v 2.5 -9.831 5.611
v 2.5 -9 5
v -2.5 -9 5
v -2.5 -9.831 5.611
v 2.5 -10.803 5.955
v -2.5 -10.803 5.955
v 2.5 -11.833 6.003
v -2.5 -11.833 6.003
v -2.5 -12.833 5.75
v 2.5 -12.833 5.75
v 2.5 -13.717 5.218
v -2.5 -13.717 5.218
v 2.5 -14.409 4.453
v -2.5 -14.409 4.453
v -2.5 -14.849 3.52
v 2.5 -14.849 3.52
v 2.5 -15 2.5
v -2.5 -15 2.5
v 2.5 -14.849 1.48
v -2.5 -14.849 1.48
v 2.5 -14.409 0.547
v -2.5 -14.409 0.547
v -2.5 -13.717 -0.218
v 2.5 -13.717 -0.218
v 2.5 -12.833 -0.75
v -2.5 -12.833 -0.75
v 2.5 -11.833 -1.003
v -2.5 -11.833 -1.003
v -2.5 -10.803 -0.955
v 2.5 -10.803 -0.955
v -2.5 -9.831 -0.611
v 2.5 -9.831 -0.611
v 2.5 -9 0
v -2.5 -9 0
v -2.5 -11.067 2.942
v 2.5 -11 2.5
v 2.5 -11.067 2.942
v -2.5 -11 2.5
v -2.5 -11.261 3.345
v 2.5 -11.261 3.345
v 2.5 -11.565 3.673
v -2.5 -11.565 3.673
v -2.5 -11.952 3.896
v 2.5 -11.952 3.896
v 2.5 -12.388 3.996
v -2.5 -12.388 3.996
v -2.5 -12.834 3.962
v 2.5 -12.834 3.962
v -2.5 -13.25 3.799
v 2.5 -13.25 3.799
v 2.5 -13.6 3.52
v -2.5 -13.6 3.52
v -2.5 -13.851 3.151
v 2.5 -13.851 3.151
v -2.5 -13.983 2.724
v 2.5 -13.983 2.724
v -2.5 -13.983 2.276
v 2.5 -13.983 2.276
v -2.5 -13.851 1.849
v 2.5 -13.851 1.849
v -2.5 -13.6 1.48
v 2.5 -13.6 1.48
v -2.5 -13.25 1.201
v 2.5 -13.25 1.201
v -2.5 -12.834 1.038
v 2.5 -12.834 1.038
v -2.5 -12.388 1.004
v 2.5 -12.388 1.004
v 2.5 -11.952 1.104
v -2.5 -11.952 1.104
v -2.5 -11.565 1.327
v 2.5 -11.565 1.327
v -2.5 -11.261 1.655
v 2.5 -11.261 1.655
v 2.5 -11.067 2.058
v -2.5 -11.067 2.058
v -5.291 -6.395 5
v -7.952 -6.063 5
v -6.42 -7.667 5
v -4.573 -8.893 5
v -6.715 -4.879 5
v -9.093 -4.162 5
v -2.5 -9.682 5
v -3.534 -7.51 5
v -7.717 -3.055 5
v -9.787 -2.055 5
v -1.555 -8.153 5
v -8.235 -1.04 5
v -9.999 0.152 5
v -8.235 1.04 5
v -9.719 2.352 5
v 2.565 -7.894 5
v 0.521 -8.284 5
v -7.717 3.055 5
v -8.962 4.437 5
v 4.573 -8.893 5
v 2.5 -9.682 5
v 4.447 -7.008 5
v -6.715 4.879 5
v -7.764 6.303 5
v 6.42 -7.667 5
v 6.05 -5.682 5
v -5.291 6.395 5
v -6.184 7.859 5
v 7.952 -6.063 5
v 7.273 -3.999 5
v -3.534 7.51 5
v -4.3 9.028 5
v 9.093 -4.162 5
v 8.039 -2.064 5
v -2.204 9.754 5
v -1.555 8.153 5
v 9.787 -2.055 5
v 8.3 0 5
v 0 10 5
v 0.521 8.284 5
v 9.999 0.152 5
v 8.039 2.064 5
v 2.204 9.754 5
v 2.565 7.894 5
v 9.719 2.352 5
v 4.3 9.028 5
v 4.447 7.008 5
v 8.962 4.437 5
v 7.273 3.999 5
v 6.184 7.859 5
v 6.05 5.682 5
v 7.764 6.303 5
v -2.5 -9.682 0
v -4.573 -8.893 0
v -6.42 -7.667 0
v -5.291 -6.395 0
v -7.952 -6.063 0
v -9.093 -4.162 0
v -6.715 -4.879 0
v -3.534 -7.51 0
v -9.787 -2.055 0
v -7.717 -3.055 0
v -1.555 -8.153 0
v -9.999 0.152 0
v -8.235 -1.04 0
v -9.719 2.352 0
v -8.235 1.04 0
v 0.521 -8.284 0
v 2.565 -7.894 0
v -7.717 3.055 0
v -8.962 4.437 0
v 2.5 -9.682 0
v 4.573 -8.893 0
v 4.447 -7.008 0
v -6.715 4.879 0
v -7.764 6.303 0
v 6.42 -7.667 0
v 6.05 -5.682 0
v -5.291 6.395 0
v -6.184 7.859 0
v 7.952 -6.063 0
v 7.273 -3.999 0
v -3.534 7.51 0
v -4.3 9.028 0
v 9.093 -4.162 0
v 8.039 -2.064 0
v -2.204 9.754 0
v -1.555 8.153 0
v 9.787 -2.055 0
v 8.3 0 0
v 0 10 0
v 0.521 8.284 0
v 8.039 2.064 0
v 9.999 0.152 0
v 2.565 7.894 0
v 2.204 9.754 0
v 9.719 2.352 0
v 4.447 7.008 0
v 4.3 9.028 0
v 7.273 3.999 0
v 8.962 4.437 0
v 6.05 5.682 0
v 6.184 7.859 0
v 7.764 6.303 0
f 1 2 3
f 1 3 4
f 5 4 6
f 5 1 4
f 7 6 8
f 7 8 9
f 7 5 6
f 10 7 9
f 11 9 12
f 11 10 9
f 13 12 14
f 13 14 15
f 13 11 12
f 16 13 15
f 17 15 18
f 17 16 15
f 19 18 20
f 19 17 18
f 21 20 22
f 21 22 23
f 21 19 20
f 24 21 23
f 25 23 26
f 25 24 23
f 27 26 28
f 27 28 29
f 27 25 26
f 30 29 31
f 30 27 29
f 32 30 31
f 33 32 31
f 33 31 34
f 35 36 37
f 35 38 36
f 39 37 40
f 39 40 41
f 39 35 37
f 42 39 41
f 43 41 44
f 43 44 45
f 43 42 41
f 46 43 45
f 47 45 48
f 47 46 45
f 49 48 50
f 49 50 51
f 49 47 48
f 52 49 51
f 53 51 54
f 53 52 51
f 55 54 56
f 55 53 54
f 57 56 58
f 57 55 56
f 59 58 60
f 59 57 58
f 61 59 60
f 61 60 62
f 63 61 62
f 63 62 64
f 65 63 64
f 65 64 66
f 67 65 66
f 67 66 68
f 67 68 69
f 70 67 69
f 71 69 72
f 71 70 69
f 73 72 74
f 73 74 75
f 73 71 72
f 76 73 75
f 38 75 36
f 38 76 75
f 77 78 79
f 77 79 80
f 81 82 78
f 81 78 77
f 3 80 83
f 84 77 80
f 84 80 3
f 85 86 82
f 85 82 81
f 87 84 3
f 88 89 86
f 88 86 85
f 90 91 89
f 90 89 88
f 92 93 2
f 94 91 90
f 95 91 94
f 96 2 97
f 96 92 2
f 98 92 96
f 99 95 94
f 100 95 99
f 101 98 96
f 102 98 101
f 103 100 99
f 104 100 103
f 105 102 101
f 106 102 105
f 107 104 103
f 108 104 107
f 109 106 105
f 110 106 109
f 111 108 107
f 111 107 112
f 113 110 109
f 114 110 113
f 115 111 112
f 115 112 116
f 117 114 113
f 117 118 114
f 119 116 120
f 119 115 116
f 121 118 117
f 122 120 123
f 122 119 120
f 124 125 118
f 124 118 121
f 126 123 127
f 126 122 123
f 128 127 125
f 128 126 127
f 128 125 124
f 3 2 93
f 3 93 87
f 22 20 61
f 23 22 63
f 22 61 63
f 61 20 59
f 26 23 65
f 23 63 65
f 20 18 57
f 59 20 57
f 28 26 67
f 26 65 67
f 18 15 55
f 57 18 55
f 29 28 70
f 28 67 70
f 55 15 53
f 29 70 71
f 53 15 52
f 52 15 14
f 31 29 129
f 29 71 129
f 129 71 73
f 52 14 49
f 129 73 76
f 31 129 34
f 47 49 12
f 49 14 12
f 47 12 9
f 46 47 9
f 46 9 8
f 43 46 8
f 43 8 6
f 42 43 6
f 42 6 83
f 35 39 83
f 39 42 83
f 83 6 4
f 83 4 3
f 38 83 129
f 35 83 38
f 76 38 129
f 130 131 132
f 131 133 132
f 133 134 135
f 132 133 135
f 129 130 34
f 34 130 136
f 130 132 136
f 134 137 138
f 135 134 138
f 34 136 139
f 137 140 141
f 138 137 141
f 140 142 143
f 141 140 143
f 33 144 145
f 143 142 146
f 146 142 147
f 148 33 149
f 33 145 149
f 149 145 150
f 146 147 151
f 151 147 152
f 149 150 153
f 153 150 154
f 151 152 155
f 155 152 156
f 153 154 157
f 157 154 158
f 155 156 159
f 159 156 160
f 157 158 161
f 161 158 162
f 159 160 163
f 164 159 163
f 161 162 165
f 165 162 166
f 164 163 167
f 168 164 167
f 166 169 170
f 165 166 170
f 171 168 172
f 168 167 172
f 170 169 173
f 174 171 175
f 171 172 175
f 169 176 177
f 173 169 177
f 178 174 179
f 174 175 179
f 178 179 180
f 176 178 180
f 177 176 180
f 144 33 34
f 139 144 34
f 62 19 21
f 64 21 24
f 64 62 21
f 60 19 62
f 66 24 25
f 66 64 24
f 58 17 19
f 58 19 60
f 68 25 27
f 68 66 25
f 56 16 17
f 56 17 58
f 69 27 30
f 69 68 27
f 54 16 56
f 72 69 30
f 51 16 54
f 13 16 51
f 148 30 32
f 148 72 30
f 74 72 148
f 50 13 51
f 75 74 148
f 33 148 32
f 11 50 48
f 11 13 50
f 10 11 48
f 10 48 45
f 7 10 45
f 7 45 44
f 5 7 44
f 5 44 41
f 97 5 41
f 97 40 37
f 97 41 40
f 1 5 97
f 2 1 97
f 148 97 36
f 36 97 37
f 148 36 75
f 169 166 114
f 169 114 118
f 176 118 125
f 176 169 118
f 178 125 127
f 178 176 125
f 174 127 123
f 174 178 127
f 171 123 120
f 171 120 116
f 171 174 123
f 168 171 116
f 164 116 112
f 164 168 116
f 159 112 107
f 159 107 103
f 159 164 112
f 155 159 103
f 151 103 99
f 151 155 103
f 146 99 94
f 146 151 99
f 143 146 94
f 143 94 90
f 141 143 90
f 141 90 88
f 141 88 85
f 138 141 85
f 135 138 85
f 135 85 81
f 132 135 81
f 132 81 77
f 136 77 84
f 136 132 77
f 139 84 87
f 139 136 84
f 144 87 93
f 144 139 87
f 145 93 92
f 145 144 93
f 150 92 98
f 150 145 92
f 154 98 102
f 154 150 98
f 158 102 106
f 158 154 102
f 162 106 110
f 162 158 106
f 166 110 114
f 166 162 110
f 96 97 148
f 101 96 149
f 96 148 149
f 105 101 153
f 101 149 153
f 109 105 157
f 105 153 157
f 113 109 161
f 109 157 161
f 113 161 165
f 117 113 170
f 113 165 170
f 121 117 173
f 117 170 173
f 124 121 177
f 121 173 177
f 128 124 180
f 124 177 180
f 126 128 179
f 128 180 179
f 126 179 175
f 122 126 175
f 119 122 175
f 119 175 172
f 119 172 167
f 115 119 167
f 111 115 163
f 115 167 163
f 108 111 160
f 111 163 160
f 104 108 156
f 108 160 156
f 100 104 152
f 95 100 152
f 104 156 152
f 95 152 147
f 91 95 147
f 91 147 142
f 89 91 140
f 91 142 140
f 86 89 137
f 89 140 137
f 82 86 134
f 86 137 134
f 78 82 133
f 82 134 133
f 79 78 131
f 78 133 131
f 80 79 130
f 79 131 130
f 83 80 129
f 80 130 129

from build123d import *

# Parameters (mm, degrees)
F0_R     = 10
F0_R_2   = 8.3
F1_DEPTH = 5
F2_R     = 1.5
F3_DEPTH = 2.5


with BuildPart() as f1:
    # F0 (on Top) → F1 (new body)
    with BuildSketch(Plane.XY):
        Circle(F0_R)
        Circle(F0_R_2, mode=Mode.SUBTRACT)
    extrude(amount=F1_DEPTH)

    # F2 (on Right) → F3 (join, symmetric)
    with BuildSketch(Plane.YZ):
        with BuildLine():
            Line((-9, 0), (-9, 5))
            ThreePointArc((-9, 5), (-15, 2.5), (-9, 0))
        make_face()
        with Locations((-12.5, 2.5)):
            Circle(F2_R, mode=Mode.SUBTRACT)
    extrude(amount=F3_DEPTH, both=True)


solid = f1.part
